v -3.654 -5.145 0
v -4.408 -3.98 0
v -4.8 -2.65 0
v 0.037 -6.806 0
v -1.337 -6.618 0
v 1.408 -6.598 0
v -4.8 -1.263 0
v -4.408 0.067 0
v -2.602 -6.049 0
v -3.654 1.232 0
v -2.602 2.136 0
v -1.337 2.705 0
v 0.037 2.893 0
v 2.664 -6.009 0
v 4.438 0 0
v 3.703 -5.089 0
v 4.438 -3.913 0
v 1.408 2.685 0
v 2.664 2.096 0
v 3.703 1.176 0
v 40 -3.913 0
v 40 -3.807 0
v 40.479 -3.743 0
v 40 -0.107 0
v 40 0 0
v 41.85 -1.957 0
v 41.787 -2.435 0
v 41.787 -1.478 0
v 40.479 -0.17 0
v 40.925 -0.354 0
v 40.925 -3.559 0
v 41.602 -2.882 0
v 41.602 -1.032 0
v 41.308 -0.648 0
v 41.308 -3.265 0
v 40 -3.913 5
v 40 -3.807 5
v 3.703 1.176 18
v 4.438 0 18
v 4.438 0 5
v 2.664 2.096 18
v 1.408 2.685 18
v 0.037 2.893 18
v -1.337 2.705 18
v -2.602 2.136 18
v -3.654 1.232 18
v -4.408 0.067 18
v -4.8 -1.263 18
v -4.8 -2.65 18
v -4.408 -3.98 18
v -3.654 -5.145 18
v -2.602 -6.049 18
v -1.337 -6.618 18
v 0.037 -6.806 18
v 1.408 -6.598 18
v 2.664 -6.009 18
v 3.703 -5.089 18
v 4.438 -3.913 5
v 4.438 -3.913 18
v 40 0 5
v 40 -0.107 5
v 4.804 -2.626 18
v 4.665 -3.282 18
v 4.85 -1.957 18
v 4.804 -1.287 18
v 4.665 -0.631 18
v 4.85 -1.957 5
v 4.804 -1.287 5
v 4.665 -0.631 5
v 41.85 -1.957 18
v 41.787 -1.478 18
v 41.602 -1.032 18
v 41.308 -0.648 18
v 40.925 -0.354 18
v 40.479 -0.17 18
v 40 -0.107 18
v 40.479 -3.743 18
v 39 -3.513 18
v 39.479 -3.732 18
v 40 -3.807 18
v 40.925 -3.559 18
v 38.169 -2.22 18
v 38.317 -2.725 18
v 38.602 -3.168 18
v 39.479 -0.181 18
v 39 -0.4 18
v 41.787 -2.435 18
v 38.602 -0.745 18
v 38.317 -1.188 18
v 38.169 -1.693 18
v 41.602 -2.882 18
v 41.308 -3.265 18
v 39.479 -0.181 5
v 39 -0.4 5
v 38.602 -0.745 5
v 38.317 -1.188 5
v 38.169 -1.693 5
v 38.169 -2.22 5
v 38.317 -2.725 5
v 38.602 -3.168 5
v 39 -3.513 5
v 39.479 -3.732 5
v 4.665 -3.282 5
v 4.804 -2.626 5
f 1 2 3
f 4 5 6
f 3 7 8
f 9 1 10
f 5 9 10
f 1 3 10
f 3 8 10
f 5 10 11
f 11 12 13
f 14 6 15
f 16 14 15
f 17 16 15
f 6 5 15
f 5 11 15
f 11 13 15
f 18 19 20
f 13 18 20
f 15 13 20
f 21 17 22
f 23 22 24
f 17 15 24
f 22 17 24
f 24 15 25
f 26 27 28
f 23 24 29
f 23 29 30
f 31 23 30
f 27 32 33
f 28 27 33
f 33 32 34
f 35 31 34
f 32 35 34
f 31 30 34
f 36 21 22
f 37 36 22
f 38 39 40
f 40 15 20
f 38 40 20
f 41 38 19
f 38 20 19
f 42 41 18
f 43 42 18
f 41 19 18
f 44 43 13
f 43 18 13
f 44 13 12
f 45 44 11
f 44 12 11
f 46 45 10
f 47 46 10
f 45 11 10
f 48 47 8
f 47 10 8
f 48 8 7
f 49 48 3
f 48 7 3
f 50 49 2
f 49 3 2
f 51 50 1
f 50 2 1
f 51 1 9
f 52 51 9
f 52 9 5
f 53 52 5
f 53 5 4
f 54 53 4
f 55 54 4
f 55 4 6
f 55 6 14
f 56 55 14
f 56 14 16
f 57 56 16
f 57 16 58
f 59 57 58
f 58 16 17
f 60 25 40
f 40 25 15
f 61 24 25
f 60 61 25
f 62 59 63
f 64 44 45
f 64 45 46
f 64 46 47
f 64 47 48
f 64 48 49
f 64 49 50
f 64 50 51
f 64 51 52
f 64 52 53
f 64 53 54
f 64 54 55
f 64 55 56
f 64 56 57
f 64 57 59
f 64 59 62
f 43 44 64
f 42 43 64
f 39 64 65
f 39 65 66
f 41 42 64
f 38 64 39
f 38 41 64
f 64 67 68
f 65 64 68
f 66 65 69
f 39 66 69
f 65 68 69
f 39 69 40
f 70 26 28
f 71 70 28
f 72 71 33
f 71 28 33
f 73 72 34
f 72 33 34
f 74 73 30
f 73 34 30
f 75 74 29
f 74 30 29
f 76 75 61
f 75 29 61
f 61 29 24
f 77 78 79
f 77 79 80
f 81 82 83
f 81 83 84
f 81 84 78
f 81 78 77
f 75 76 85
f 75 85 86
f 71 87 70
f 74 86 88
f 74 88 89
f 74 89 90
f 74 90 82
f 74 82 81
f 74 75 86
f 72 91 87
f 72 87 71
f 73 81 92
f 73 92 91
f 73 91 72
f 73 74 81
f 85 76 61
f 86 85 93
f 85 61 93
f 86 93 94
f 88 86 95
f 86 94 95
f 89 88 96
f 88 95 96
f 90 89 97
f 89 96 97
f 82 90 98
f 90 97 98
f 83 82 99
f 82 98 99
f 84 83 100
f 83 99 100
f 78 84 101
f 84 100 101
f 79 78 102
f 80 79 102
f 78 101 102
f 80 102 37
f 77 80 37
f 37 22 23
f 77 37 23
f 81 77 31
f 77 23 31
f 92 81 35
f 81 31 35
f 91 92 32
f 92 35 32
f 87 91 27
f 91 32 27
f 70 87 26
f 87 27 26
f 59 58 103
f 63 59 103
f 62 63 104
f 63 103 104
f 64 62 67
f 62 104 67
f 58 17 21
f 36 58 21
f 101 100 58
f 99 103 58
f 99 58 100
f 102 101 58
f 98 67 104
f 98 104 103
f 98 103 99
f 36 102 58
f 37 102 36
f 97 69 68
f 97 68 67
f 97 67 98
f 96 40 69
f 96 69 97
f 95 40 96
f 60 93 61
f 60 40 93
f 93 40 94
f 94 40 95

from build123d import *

# Parameters (mm, degrees)
BOSS_EXTRUDE1_DEPTH = 5
SKETCH1_3_R         = 4.85
SKETCH1_3_R_2       = 1.85
BOSS_EXTRUDE2_DEPTH = 18


with BuildPart() as part:
    # Sketch1 → Boss-Extrude1 (new body)
    with BuildSketch(Plane.XY):
        with BuildLine():
            Line((40, 0), (4.437851134, 0))
            ThreePointArc((4.437851134, 0), (4.745844393, -0.956791275), (4.85, -1.956521739))
            ThreePointArc((4.85, -1.956521739), (4.745844393, -2.956252203), (4.437851134, -3.913043478))
            Line((4.437851134, -3.913043478), (40, -3.913043478))
            Line((40, -3.913043478), (40, -3.806521739))
            ThreePointArc((40, -3.806521739), (38.15, -1.956521739), (40, -0.106521739))
            Line((40, -0.106521739), (40, 0))
        make_face()
    extrude(amount=BOSS_EXTRUDE1_DEPTH)

    # Sketch1<3> → Boss-Extrude2 (add)
    with BuildSketch(Plane.XY):
        with Locations((0, -1.956521739)):
            Circle(SKETCH1_3_R)
        with Locations((40, -1.956521739)):
            Circle(SKETCH1_3_R_2)
    extrude(amount=BOSS_EXTRUDE2_DEPTH)


solid = part.part
